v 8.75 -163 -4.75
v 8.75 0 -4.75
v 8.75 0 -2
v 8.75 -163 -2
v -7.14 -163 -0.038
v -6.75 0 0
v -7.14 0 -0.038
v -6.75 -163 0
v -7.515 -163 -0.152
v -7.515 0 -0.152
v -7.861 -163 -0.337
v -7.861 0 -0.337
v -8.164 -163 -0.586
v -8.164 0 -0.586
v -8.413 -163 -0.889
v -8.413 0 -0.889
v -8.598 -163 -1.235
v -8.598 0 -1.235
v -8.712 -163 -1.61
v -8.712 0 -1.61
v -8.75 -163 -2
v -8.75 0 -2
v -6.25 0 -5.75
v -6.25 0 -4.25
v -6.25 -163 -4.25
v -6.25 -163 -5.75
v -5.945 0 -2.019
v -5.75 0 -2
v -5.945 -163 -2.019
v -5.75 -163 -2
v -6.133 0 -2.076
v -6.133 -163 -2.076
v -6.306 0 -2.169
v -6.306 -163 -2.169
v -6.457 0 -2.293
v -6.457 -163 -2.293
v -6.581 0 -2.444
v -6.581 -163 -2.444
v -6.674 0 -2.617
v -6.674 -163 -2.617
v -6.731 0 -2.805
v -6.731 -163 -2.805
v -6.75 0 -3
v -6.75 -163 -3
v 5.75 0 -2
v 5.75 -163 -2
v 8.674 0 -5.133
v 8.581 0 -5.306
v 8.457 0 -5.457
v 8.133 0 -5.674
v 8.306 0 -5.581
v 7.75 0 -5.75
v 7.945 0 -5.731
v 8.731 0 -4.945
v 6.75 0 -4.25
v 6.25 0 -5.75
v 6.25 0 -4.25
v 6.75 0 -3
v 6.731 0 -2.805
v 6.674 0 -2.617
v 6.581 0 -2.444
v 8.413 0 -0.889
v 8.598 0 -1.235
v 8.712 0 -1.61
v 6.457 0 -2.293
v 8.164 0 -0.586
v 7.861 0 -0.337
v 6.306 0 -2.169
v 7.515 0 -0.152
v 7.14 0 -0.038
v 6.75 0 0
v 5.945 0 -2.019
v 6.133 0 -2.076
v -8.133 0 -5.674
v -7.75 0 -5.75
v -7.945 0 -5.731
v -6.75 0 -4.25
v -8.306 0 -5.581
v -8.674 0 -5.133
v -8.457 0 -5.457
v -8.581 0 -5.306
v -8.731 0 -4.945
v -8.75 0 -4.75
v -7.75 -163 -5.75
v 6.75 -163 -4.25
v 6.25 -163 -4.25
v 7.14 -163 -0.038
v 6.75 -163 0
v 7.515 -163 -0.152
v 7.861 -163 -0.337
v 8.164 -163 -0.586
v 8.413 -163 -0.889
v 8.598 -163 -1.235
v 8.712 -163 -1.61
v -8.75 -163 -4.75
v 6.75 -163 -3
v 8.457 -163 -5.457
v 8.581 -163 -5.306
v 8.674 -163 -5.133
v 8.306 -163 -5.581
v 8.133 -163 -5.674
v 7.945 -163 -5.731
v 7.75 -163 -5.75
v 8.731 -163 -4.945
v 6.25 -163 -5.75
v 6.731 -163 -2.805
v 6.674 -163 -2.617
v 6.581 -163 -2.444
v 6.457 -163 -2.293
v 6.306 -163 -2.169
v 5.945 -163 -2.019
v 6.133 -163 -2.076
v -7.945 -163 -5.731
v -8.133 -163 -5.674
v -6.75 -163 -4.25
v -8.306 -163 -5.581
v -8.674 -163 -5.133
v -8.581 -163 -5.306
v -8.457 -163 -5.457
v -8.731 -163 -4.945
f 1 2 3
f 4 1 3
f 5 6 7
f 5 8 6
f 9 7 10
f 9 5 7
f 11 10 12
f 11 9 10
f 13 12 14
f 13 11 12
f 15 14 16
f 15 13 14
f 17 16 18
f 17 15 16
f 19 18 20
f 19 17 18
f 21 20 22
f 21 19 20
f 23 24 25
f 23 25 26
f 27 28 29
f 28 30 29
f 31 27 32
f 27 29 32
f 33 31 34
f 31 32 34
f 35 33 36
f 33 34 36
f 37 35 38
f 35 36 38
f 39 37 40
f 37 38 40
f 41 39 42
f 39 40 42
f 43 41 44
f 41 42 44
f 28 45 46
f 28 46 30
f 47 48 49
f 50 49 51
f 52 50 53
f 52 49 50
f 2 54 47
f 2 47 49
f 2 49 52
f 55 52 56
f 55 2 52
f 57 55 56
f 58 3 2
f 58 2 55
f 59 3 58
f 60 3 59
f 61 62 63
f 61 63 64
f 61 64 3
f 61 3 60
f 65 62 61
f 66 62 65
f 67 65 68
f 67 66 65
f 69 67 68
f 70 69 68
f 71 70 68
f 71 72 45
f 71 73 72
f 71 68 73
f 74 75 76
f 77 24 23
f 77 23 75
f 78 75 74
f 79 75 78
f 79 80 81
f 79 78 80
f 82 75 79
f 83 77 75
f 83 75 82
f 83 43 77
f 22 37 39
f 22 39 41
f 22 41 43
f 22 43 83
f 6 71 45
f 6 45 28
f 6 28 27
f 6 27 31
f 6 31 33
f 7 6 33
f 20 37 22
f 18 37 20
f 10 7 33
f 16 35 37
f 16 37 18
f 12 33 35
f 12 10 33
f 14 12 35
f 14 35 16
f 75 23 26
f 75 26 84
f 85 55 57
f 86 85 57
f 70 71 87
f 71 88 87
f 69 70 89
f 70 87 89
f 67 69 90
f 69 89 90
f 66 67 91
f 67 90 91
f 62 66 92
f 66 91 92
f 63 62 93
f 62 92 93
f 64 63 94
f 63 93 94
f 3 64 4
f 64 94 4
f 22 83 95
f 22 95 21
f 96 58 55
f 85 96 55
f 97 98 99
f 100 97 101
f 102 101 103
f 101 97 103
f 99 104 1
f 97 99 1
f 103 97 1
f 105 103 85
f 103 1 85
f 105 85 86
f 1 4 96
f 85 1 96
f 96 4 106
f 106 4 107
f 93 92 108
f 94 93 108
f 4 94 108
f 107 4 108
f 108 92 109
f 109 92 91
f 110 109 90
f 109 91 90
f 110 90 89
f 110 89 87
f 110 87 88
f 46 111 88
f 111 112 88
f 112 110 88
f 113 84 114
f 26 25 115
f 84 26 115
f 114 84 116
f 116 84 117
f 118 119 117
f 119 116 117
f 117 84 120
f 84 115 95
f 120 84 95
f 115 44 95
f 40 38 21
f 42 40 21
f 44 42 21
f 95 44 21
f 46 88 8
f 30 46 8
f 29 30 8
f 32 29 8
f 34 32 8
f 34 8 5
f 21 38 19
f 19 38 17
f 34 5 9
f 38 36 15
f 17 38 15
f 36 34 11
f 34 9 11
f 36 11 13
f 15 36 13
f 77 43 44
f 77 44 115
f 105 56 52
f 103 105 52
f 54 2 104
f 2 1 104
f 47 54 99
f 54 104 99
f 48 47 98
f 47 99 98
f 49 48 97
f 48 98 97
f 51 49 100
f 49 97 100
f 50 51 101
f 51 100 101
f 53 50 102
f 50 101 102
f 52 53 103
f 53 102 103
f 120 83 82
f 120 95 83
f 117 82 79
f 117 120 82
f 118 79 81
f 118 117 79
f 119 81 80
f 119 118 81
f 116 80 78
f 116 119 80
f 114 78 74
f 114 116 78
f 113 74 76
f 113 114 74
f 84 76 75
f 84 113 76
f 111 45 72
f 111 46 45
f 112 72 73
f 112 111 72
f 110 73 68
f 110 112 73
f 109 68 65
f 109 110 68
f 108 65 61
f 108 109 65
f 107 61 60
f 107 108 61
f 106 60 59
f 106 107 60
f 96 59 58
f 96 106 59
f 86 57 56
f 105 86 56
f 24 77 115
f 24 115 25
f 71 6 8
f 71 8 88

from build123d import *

# Parameters (mm, degrees)
F1_DEPTH = 163
F2_R     = 2
F3_R     = 1
F4_R     = 1


with BuildPart() as f1:
    # F0 (on Front) → F1 (new body)
    with BuildSketch(Plane.XZ):
        Polygon((8.75, 0), (0, 0), (0, -2), (6.75, -2), (6.75, -4.25), (6.25, -4.25), (6.25, -5.75), (8.75, -5.75), align=None)
    extrude(amount=F1_DEPTH)

    # F2
    f2_edges = [f1.edges().sort_by_distance(p)[0] for p in [
        (8.75, -81.5, 0),
    ]]
    fillet(f2_edges, radius=F2_R)

    # F3
    f3_edges = [f1.edges().sort_by_distance(p)[0] for p in [
        (6.75, -81.5, -2),
    ]]
    fillet(f3_edges, radius=F3_R)

    # F4
    f4_edges = [f1.edges().sort_by_distance(p)[0] for p in [
        (8.75, -81.5, -5.75),
    ]]
    fillet(f4_edges, radius=F4_R)

    # F5: F1 across plane


with BuildPart() as f1_1:
    add(f1.part)
    add(f1.part.mirror(Plane.YZ))


solid = f1_1.part
